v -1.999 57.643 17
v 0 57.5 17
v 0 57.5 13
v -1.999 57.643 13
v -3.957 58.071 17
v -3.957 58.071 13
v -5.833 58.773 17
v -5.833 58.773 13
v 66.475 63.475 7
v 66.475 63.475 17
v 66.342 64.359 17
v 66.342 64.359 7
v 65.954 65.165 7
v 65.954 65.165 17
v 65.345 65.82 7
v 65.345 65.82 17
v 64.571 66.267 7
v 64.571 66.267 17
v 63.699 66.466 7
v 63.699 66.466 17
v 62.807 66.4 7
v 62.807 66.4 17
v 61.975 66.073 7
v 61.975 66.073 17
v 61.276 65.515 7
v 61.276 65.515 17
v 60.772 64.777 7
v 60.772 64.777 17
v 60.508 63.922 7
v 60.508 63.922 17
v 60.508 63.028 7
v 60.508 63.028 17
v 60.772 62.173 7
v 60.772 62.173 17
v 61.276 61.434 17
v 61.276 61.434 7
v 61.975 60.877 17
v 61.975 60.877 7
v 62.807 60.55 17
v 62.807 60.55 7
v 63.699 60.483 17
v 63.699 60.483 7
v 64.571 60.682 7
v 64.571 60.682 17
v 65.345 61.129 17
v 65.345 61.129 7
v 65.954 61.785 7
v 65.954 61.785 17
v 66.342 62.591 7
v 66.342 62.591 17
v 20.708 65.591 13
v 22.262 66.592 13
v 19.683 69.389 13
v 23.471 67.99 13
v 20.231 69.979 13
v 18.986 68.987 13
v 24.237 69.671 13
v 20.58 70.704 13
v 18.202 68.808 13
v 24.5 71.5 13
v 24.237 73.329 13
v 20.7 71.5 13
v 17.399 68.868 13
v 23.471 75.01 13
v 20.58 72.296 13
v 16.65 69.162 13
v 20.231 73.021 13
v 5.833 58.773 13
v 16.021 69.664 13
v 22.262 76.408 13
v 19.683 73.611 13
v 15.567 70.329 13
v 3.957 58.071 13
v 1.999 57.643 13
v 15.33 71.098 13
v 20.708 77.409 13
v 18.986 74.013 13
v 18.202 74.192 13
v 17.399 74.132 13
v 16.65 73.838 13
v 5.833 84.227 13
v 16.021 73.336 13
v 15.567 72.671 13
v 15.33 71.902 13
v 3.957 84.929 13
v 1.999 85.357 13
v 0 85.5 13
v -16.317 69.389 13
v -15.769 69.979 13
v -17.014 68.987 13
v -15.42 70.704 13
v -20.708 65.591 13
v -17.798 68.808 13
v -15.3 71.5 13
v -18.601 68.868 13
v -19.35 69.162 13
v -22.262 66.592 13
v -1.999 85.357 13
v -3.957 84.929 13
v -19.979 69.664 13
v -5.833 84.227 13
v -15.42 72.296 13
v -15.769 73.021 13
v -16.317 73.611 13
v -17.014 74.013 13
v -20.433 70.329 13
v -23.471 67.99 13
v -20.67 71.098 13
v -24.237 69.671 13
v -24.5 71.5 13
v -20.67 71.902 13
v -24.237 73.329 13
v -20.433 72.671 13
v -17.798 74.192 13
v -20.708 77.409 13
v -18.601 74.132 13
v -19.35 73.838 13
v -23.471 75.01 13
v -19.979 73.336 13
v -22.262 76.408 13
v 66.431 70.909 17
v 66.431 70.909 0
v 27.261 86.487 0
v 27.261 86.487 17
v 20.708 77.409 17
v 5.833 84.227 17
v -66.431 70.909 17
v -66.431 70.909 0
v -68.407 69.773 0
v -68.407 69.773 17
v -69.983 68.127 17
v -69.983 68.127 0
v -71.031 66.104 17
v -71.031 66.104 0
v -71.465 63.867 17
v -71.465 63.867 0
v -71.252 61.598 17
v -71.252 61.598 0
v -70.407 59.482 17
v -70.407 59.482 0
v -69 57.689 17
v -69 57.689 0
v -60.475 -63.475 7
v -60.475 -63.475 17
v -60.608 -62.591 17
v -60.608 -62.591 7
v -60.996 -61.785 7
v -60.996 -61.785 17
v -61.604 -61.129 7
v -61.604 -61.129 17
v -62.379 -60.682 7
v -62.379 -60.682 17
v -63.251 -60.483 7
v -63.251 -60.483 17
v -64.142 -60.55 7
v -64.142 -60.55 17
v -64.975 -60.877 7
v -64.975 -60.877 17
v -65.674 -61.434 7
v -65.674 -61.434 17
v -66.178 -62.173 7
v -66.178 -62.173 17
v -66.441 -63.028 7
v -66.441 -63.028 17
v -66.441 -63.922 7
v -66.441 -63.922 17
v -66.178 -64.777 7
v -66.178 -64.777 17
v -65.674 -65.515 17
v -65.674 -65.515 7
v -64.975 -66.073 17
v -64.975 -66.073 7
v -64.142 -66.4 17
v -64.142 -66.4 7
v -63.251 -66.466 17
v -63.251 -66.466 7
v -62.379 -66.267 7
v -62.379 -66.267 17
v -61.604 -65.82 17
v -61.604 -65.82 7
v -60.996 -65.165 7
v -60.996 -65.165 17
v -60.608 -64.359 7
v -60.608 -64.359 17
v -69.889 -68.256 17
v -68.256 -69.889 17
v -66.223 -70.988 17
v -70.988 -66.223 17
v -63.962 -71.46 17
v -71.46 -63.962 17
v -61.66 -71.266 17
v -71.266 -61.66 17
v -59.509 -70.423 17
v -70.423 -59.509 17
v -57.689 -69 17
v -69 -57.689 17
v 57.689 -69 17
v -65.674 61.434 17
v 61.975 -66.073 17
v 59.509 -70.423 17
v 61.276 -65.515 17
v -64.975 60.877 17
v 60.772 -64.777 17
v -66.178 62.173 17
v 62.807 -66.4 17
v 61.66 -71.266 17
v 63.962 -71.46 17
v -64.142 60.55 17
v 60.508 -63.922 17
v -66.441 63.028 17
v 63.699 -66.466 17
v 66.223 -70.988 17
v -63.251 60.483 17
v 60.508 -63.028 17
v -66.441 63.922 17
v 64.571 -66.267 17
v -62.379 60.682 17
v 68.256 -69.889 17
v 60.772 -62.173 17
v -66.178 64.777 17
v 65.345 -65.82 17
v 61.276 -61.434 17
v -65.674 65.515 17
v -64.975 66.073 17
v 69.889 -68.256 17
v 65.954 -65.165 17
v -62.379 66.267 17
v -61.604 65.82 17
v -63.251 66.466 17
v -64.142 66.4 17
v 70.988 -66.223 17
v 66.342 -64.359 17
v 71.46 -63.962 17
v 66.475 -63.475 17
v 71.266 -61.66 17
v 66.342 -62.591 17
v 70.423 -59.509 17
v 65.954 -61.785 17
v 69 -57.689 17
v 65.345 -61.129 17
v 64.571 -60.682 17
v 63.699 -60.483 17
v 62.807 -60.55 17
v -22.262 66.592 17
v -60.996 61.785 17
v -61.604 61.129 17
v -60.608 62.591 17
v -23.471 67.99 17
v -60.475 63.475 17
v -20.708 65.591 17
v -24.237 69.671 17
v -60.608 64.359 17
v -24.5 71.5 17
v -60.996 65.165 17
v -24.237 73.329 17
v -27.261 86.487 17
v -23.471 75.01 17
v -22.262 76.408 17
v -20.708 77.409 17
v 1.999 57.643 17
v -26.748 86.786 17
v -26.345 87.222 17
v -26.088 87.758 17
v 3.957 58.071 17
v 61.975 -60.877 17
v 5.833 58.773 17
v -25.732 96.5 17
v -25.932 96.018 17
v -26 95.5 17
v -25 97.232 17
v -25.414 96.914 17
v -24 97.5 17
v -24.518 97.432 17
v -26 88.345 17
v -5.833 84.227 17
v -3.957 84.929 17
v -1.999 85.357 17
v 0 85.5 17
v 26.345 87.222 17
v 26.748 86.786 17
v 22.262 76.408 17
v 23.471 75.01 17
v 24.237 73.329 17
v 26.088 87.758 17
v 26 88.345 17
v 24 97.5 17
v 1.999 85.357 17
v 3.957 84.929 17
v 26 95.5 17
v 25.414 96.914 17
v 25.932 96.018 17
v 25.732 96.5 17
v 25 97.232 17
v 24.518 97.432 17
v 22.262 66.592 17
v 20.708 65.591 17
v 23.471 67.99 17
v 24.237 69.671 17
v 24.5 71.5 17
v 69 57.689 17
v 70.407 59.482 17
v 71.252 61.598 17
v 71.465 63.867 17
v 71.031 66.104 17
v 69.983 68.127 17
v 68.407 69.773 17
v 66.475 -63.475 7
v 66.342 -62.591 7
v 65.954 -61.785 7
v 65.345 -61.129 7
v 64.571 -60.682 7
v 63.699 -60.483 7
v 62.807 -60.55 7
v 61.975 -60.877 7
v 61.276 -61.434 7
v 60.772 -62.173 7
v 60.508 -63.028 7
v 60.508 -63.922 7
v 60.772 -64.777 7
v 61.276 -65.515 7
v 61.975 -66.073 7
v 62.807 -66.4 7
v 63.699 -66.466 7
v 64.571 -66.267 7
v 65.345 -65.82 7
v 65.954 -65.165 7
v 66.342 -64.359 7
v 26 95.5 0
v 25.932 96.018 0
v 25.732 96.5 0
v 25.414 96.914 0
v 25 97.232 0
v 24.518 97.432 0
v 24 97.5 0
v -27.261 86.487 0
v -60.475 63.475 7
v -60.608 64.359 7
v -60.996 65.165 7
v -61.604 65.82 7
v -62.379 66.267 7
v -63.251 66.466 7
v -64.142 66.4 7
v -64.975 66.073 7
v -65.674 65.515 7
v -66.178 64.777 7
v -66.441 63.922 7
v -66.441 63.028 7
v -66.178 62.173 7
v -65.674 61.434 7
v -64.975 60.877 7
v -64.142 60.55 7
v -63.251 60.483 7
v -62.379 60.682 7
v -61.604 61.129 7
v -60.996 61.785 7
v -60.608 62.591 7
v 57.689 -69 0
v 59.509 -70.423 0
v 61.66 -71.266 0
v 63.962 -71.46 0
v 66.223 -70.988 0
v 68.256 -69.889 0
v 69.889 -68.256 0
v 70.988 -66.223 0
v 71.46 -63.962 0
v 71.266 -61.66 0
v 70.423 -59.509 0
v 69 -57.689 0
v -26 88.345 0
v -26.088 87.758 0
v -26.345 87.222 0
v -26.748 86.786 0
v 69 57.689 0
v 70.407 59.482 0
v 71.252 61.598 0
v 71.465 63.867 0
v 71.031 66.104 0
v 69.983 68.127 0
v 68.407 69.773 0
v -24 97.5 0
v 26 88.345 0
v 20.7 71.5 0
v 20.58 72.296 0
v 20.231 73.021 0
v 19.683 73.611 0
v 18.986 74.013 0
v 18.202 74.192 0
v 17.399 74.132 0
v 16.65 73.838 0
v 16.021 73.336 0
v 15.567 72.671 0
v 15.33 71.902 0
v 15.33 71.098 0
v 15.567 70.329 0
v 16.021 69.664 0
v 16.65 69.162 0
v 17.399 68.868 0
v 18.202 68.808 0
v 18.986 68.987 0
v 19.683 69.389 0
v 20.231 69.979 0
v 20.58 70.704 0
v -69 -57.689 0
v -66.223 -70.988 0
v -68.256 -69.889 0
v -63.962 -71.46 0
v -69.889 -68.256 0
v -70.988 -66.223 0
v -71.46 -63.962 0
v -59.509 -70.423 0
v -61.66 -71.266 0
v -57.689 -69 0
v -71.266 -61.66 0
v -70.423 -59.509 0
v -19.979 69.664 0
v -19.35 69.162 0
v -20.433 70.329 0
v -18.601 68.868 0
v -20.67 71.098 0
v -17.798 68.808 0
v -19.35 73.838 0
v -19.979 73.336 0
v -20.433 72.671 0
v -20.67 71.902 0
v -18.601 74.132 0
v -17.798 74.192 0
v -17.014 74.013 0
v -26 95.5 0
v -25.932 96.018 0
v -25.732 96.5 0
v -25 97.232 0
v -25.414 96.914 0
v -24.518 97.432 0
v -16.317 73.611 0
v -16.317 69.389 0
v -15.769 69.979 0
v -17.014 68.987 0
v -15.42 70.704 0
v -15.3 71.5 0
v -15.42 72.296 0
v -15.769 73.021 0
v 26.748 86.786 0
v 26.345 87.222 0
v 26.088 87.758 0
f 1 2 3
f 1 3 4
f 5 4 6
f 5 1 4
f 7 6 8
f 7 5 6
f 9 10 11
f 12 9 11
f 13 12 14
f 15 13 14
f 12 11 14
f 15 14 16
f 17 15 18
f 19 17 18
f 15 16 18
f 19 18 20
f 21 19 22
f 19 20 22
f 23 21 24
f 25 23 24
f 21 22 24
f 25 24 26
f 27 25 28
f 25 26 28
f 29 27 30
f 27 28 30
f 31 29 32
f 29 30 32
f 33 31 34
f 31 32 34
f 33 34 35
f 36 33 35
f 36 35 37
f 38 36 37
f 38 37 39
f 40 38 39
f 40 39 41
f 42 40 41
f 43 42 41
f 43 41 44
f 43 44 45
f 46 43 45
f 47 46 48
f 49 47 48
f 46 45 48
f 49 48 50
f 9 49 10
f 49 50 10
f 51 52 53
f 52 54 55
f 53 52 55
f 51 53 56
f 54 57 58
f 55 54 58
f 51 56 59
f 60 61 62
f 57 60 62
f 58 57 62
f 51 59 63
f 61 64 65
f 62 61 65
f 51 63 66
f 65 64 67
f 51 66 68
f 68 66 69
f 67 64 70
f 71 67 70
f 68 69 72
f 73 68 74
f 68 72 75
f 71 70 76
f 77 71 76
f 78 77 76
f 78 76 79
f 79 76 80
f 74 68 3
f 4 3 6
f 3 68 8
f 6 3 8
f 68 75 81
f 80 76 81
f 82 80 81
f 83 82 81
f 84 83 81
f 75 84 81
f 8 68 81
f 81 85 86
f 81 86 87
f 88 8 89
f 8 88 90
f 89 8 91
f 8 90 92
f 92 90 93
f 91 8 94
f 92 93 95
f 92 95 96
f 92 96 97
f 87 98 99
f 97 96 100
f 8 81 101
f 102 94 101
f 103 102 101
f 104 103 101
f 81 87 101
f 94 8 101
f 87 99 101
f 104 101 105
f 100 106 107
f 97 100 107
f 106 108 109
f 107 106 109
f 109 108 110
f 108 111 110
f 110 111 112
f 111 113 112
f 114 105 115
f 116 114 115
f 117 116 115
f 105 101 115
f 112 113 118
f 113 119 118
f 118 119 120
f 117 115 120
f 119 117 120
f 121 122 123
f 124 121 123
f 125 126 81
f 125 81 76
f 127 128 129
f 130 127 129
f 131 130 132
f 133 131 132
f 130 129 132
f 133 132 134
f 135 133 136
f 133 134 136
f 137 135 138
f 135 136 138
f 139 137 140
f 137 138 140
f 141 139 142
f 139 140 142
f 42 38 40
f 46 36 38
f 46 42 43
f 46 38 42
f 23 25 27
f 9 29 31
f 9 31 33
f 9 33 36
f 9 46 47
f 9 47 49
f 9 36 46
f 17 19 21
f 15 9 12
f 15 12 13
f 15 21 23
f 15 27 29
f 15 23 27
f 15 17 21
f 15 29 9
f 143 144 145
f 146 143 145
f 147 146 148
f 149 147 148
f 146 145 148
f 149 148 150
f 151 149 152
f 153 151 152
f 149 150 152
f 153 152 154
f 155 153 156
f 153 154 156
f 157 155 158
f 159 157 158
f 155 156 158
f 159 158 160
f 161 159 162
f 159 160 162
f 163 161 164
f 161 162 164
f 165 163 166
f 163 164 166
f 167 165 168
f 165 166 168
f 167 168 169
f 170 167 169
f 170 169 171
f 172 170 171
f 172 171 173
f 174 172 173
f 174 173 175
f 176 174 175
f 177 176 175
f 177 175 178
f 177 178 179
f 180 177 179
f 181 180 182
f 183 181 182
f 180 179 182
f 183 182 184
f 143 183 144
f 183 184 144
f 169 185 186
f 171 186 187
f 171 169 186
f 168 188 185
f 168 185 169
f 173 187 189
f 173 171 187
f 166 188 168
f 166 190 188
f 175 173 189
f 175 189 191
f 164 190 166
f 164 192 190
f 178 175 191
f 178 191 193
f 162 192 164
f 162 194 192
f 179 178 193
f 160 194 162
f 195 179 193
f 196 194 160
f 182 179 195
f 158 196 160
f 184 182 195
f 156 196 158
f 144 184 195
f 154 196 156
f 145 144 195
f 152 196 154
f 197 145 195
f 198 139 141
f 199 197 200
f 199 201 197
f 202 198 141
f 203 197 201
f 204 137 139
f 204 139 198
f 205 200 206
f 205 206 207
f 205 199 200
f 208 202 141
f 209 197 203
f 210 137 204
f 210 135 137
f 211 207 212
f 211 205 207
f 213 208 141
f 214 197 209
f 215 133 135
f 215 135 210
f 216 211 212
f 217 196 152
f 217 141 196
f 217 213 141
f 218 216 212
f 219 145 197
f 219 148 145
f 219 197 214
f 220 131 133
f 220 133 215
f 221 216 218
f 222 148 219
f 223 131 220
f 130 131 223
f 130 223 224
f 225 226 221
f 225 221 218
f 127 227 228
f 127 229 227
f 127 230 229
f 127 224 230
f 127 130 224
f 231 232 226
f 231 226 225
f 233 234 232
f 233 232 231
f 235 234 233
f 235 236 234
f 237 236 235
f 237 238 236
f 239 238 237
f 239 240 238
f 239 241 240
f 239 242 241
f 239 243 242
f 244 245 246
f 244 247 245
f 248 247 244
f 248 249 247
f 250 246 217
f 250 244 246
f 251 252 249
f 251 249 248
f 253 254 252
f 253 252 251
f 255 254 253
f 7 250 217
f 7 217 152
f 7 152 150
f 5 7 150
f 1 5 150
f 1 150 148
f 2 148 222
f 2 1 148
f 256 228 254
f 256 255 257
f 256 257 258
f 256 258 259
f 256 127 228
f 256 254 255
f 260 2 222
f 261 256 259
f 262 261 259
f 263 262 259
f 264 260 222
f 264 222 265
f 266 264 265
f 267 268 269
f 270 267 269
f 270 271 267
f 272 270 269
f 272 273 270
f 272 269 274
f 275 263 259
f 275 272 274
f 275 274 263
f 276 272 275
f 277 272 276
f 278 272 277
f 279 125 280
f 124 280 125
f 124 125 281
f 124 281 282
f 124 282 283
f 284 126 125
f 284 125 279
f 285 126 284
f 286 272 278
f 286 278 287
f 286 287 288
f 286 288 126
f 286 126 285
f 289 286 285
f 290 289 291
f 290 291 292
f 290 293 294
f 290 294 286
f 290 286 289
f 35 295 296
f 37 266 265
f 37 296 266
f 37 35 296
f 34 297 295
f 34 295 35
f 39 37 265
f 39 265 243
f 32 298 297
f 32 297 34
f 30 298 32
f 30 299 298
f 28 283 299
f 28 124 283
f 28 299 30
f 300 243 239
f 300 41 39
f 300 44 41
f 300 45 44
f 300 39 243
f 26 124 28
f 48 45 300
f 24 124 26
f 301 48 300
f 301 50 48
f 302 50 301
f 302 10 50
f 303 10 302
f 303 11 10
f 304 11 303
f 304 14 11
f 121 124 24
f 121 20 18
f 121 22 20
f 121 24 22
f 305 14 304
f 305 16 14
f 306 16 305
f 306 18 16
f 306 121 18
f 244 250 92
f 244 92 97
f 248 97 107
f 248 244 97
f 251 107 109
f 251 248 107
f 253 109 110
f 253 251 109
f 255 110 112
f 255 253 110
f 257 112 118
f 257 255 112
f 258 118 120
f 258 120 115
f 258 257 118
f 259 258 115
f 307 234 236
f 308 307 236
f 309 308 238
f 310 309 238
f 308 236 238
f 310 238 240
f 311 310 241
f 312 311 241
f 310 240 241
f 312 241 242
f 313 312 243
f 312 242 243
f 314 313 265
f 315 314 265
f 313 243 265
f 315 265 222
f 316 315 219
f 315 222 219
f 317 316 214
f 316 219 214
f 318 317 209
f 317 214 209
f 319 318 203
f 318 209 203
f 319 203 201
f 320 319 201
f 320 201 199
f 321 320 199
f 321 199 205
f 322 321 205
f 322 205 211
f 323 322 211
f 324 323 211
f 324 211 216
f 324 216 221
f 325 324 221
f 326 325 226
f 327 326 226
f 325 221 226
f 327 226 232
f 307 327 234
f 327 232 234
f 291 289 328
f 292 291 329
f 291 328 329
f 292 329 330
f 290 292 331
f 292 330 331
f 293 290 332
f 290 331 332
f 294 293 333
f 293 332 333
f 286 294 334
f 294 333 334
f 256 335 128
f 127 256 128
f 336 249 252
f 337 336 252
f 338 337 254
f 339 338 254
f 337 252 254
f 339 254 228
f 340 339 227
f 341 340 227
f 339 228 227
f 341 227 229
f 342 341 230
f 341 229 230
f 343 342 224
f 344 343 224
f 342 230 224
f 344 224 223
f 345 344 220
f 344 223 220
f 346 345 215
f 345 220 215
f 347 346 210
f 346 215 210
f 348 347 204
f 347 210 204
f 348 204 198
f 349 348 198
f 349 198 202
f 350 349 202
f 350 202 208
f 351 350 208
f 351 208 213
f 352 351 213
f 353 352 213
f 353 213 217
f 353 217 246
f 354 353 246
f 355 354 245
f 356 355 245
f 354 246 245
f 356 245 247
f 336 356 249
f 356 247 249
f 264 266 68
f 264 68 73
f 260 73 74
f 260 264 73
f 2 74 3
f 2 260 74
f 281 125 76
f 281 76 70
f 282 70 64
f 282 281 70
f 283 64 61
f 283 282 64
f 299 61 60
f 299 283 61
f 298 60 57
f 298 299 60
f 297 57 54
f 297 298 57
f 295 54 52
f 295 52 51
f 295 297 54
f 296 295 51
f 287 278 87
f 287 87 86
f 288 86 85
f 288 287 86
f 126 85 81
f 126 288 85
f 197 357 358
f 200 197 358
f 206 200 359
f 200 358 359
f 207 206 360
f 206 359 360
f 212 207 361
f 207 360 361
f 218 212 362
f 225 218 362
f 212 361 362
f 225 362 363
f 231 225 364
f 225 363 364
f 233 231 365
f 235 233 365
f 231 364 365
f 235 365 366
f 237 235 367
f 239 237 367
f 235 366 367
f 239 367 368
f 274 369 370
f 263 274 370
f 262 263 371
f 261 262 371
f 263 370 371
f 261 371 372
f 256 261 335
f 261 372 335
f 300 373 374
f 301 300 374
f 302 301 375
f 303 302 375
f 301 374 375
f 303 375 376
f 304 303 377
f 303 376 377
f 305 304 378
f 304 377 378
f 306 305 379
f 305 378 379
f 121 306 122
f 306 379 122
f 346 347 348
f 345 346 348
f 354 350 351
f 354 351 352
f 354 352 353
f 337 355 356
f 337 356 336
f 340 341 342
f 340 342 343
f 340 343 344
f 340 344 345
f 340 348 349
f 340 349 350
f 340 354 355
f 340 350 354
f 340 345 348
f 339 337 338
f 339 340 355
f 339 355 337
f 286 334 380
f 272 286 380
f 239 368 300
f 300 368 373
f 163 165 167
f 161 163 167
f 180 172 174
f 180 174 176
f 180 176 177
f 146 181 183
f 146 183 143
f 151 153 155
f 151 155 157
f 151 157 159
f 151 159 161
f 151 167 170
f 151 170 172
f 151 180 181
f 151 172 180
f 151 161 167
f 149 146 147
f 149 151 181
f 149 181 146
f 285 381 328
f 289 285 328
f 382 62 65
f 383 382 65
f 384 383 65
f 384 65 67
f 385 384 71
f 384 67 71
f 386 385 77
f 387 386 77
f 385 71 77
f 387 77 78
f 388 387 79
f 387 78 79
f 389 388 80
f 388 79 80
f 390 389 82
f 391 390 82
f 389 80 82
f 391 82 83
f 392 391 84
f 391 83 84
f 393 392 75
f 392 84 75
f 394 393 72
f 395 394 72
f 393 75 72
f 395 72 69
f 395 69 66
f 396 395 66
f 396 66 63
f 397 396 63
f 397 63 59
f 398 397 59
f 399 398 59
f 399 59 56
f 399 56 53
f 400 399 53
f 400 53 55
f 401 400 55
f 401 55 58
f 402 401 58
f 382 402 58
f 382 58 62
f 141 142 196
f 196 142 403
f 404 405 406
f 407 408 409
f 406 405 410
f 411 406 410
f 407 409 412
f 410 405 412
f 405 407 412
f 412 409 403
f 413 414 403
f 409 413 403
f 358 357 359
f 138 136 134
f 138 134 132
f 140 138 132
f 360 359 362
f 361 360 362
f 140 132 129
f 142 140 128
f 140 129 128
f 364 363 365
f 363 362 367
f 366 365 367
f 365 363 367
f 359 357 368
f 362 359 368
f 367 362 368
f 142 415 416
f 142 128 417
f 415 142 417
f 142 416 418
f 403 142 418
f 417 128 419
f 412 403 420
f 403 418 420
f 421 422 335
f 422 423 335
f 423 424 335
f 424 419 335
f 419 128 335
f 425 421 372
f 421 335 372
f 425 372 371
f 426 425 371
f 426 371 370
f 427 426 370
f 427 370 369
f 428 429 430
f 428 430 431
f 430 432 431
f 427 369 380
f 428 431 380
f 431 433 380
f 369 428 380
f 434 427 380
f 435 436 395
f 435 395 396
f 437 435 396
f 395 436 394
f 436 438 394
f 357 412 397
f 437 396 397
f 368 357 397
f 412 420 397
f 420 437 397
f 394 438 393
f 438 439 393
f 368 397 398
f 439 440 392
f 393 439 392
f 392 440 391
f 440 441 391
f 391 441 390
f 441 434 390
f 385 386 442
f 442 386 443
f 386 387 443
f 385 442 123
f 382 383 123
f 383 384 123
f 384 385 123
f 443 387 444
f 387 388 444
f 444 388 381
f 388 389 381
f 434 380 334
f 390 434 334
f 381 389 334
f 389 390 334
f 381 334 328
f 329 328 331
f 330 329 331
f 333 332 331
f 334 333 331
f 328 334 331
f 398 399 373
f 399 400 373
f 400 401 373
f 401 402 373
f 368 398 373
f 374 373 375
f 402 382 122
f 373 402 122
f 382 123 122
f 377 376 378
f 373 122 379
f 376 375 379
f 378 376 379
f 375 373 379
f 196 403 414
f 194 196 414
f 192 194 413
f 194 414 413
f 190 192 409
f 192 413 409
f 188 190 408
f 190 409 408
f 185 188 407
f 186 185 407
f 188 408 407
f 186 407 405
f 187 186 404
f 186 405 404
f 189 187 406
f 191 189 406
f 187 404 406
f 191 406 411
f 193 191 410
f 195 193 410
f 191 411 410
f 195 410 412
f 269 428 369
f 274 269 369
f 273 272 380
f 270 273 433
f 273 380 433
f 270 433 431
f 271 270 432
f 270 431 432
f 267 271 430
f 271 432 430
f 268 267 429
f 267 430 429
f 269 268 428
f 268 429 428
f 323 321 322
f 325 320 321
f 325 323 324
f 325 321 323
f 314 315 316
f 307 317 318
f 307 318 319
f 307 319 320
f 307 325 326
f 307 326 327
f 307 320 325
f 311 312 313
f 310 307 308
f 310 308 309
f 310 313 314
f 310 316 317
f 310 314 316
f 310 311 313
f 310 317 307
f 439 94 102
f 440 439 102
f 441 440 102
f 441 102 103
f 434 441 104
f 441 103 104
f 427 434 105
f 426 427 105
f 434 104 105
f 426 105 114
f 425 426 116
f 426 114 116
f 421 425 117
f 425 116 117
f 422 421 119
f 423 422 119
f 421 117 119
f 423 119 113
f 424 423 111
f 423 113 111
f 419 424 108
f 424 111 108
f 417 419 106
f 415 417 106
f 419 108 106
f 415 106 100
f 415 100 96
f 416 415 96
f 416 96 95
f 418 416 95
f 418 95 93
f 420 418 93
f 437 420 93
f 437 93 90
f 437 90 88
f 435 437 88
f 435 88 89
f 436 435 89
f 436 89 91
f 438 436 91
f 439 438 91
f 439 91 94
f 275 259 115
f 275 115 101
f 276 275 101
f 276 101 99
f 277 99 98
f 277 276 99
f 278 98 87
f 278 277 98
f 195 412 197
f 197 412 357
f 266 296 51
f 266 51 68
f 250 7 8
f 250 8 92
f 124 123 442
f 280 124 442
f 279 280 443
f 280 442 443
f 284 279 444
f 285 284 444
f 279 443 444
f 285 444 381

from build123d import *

# Parameters (mm, degrees)
EXTRUDE_1_DEPTH     = 17
SKETCH_2_R          = 3
CUT_EXTRUDE_1_DEPTH = 10
CUT_EXTRUDE_2_DEPTH = 4
SKETCH_5_R          = 2.7
CUT_EXTRUDE_3_DEPTH = 20


with BuildPart() as part:
    # 草图1 → 凸台-拉伸1 (new body)
    with BuildSketch(Plane.XY):
        with BuildLine():
            Line((-57.689289948, -69), (57.689289948, -69))
            ThreePointArc((57.689289948, -69), (69.131727984, -69.131727984), (69, -57.689289948))
            Line((69, -57.689289948), (69, 57.689289948))
            ThreePointArc((69, 57.689289948), (71.327983317, 65.000871727), (66.431261108, 70.908565529))
            Line((66.431261108, 70.908565529), (27.260903157, 86.486659817))
            ThreePointArc((27.260903157, 86.486659817), (26.344978295, 87.222183323), (26, 88.345082765))
            Line((26, 88.345082765), (26, 95.5))
            ThreePointArc((26, 95.5), (25.414213562, 96.914213562), (24, 97.5))
            Line((24, 97.5), (-24, 97.5))
            ThreePointArc((-24, 97.5), (-25.414213562, 96.914213562), (-26, 95.5))
            Line((-26, 95.5), (-26, 88.345082765))
            ThreePointArc((-26, 88.345082765), (-26.344978295, 87.222183323), (-27.260903157, 86.486659817))
            Line((-27.260903157, 86.486659817), (-66.431261108, 70.908565529))
            ThreePointArc((-66.431261108, 70.908565529), (-71.327983317, 65.000871727), (-69, 57.689289948))
            Line((-69, 57.689289948), (-69, -57.689289948))
            ThreePointArc((-69, -57.689289948), (-69.131727984, -69.131727984), (-57.689289948, -69))
        make_face()
    extrude(amount=EXTRUDE_1_DEPTH)

    # 草图2 → 切除-拉伸1 (cut)
    with BuildSketch(Plane.XY.offset(17)):
        with Locations((-63.474873734, 63.474873734)):
            Circle(SKETCH_2_R)
        with Locations((63.474873734, 63.474873734)):
            Circle(SKETCH_2_R)
        with Locations((-63.474873734, -63.474873734)):
            Circle(SKETCH_2_R)
        with Locations((63.474873734, -63.474873734)):
            Circle(SKETCH_2_R)
    extrude(amount=-CUT_EXTRUDE_1_DEPTH, mode=Mode.SUBTRACT)

    # 草图3 → 切除-拉伸2 (cut)
    with BuildSketch(Plane.XY.offset(17)):
        with BuildLine():
            Line((-20.708333333, 77.408885729), (-5.833333333, 84.2268308))
            ThreePointArc((-5.833333333, 84.2268308), (-2.985328189, 85.178004811), (0, 85.5))
            ThreePointArc((0, 85.5), (2.985328189, 85.178004811), (5.833333333, 84.2268308))
            Line((5.833333333, 84.2268308), (20.708333333, 77.408885729))
            ThreePointArc((20.708333333, 77.408885729), (24.5, 71.5), (20.708333333, 65.591114271))
            Line((20.708333333, 65.591114271), (5.833333333, 58.7731692))
            ThreePointArc((5.833333333, 58.7731692), (2.985328189, 57.821995189), (0, 57.5))
            ThreePointArc((0, 57.5), (-2.985328189, 57.821995189), (-5.833333333, 58.7731692))
            Line((-5.833333333, 58.7731692), (-20.708333333, 65.591114271))
            ThreePointArc((-20.708333333, 65.591114271), (-24.5, 71.5), (-20.708333333, 77.408885729))
        make_face()
    extrude(amount=-CUT_EXTRUDE_2_DEPTH, mode=Mode.SUBTRACT)

    # 草图5 → 切除-拉伸3 (cut)
    with BuildSketch(Plane.XY.offset(13)):
        with Locations((-18, 71.5)):
            Circle(SKETCH_5_R)
        with Locations((18, 71.5)):
            Circle(SKETCH_5_R)
    extrude(amount=-CUT_EXTRUDE_3_DEPTH, mode=Mode.SUBTRACT)


solid = part.part
